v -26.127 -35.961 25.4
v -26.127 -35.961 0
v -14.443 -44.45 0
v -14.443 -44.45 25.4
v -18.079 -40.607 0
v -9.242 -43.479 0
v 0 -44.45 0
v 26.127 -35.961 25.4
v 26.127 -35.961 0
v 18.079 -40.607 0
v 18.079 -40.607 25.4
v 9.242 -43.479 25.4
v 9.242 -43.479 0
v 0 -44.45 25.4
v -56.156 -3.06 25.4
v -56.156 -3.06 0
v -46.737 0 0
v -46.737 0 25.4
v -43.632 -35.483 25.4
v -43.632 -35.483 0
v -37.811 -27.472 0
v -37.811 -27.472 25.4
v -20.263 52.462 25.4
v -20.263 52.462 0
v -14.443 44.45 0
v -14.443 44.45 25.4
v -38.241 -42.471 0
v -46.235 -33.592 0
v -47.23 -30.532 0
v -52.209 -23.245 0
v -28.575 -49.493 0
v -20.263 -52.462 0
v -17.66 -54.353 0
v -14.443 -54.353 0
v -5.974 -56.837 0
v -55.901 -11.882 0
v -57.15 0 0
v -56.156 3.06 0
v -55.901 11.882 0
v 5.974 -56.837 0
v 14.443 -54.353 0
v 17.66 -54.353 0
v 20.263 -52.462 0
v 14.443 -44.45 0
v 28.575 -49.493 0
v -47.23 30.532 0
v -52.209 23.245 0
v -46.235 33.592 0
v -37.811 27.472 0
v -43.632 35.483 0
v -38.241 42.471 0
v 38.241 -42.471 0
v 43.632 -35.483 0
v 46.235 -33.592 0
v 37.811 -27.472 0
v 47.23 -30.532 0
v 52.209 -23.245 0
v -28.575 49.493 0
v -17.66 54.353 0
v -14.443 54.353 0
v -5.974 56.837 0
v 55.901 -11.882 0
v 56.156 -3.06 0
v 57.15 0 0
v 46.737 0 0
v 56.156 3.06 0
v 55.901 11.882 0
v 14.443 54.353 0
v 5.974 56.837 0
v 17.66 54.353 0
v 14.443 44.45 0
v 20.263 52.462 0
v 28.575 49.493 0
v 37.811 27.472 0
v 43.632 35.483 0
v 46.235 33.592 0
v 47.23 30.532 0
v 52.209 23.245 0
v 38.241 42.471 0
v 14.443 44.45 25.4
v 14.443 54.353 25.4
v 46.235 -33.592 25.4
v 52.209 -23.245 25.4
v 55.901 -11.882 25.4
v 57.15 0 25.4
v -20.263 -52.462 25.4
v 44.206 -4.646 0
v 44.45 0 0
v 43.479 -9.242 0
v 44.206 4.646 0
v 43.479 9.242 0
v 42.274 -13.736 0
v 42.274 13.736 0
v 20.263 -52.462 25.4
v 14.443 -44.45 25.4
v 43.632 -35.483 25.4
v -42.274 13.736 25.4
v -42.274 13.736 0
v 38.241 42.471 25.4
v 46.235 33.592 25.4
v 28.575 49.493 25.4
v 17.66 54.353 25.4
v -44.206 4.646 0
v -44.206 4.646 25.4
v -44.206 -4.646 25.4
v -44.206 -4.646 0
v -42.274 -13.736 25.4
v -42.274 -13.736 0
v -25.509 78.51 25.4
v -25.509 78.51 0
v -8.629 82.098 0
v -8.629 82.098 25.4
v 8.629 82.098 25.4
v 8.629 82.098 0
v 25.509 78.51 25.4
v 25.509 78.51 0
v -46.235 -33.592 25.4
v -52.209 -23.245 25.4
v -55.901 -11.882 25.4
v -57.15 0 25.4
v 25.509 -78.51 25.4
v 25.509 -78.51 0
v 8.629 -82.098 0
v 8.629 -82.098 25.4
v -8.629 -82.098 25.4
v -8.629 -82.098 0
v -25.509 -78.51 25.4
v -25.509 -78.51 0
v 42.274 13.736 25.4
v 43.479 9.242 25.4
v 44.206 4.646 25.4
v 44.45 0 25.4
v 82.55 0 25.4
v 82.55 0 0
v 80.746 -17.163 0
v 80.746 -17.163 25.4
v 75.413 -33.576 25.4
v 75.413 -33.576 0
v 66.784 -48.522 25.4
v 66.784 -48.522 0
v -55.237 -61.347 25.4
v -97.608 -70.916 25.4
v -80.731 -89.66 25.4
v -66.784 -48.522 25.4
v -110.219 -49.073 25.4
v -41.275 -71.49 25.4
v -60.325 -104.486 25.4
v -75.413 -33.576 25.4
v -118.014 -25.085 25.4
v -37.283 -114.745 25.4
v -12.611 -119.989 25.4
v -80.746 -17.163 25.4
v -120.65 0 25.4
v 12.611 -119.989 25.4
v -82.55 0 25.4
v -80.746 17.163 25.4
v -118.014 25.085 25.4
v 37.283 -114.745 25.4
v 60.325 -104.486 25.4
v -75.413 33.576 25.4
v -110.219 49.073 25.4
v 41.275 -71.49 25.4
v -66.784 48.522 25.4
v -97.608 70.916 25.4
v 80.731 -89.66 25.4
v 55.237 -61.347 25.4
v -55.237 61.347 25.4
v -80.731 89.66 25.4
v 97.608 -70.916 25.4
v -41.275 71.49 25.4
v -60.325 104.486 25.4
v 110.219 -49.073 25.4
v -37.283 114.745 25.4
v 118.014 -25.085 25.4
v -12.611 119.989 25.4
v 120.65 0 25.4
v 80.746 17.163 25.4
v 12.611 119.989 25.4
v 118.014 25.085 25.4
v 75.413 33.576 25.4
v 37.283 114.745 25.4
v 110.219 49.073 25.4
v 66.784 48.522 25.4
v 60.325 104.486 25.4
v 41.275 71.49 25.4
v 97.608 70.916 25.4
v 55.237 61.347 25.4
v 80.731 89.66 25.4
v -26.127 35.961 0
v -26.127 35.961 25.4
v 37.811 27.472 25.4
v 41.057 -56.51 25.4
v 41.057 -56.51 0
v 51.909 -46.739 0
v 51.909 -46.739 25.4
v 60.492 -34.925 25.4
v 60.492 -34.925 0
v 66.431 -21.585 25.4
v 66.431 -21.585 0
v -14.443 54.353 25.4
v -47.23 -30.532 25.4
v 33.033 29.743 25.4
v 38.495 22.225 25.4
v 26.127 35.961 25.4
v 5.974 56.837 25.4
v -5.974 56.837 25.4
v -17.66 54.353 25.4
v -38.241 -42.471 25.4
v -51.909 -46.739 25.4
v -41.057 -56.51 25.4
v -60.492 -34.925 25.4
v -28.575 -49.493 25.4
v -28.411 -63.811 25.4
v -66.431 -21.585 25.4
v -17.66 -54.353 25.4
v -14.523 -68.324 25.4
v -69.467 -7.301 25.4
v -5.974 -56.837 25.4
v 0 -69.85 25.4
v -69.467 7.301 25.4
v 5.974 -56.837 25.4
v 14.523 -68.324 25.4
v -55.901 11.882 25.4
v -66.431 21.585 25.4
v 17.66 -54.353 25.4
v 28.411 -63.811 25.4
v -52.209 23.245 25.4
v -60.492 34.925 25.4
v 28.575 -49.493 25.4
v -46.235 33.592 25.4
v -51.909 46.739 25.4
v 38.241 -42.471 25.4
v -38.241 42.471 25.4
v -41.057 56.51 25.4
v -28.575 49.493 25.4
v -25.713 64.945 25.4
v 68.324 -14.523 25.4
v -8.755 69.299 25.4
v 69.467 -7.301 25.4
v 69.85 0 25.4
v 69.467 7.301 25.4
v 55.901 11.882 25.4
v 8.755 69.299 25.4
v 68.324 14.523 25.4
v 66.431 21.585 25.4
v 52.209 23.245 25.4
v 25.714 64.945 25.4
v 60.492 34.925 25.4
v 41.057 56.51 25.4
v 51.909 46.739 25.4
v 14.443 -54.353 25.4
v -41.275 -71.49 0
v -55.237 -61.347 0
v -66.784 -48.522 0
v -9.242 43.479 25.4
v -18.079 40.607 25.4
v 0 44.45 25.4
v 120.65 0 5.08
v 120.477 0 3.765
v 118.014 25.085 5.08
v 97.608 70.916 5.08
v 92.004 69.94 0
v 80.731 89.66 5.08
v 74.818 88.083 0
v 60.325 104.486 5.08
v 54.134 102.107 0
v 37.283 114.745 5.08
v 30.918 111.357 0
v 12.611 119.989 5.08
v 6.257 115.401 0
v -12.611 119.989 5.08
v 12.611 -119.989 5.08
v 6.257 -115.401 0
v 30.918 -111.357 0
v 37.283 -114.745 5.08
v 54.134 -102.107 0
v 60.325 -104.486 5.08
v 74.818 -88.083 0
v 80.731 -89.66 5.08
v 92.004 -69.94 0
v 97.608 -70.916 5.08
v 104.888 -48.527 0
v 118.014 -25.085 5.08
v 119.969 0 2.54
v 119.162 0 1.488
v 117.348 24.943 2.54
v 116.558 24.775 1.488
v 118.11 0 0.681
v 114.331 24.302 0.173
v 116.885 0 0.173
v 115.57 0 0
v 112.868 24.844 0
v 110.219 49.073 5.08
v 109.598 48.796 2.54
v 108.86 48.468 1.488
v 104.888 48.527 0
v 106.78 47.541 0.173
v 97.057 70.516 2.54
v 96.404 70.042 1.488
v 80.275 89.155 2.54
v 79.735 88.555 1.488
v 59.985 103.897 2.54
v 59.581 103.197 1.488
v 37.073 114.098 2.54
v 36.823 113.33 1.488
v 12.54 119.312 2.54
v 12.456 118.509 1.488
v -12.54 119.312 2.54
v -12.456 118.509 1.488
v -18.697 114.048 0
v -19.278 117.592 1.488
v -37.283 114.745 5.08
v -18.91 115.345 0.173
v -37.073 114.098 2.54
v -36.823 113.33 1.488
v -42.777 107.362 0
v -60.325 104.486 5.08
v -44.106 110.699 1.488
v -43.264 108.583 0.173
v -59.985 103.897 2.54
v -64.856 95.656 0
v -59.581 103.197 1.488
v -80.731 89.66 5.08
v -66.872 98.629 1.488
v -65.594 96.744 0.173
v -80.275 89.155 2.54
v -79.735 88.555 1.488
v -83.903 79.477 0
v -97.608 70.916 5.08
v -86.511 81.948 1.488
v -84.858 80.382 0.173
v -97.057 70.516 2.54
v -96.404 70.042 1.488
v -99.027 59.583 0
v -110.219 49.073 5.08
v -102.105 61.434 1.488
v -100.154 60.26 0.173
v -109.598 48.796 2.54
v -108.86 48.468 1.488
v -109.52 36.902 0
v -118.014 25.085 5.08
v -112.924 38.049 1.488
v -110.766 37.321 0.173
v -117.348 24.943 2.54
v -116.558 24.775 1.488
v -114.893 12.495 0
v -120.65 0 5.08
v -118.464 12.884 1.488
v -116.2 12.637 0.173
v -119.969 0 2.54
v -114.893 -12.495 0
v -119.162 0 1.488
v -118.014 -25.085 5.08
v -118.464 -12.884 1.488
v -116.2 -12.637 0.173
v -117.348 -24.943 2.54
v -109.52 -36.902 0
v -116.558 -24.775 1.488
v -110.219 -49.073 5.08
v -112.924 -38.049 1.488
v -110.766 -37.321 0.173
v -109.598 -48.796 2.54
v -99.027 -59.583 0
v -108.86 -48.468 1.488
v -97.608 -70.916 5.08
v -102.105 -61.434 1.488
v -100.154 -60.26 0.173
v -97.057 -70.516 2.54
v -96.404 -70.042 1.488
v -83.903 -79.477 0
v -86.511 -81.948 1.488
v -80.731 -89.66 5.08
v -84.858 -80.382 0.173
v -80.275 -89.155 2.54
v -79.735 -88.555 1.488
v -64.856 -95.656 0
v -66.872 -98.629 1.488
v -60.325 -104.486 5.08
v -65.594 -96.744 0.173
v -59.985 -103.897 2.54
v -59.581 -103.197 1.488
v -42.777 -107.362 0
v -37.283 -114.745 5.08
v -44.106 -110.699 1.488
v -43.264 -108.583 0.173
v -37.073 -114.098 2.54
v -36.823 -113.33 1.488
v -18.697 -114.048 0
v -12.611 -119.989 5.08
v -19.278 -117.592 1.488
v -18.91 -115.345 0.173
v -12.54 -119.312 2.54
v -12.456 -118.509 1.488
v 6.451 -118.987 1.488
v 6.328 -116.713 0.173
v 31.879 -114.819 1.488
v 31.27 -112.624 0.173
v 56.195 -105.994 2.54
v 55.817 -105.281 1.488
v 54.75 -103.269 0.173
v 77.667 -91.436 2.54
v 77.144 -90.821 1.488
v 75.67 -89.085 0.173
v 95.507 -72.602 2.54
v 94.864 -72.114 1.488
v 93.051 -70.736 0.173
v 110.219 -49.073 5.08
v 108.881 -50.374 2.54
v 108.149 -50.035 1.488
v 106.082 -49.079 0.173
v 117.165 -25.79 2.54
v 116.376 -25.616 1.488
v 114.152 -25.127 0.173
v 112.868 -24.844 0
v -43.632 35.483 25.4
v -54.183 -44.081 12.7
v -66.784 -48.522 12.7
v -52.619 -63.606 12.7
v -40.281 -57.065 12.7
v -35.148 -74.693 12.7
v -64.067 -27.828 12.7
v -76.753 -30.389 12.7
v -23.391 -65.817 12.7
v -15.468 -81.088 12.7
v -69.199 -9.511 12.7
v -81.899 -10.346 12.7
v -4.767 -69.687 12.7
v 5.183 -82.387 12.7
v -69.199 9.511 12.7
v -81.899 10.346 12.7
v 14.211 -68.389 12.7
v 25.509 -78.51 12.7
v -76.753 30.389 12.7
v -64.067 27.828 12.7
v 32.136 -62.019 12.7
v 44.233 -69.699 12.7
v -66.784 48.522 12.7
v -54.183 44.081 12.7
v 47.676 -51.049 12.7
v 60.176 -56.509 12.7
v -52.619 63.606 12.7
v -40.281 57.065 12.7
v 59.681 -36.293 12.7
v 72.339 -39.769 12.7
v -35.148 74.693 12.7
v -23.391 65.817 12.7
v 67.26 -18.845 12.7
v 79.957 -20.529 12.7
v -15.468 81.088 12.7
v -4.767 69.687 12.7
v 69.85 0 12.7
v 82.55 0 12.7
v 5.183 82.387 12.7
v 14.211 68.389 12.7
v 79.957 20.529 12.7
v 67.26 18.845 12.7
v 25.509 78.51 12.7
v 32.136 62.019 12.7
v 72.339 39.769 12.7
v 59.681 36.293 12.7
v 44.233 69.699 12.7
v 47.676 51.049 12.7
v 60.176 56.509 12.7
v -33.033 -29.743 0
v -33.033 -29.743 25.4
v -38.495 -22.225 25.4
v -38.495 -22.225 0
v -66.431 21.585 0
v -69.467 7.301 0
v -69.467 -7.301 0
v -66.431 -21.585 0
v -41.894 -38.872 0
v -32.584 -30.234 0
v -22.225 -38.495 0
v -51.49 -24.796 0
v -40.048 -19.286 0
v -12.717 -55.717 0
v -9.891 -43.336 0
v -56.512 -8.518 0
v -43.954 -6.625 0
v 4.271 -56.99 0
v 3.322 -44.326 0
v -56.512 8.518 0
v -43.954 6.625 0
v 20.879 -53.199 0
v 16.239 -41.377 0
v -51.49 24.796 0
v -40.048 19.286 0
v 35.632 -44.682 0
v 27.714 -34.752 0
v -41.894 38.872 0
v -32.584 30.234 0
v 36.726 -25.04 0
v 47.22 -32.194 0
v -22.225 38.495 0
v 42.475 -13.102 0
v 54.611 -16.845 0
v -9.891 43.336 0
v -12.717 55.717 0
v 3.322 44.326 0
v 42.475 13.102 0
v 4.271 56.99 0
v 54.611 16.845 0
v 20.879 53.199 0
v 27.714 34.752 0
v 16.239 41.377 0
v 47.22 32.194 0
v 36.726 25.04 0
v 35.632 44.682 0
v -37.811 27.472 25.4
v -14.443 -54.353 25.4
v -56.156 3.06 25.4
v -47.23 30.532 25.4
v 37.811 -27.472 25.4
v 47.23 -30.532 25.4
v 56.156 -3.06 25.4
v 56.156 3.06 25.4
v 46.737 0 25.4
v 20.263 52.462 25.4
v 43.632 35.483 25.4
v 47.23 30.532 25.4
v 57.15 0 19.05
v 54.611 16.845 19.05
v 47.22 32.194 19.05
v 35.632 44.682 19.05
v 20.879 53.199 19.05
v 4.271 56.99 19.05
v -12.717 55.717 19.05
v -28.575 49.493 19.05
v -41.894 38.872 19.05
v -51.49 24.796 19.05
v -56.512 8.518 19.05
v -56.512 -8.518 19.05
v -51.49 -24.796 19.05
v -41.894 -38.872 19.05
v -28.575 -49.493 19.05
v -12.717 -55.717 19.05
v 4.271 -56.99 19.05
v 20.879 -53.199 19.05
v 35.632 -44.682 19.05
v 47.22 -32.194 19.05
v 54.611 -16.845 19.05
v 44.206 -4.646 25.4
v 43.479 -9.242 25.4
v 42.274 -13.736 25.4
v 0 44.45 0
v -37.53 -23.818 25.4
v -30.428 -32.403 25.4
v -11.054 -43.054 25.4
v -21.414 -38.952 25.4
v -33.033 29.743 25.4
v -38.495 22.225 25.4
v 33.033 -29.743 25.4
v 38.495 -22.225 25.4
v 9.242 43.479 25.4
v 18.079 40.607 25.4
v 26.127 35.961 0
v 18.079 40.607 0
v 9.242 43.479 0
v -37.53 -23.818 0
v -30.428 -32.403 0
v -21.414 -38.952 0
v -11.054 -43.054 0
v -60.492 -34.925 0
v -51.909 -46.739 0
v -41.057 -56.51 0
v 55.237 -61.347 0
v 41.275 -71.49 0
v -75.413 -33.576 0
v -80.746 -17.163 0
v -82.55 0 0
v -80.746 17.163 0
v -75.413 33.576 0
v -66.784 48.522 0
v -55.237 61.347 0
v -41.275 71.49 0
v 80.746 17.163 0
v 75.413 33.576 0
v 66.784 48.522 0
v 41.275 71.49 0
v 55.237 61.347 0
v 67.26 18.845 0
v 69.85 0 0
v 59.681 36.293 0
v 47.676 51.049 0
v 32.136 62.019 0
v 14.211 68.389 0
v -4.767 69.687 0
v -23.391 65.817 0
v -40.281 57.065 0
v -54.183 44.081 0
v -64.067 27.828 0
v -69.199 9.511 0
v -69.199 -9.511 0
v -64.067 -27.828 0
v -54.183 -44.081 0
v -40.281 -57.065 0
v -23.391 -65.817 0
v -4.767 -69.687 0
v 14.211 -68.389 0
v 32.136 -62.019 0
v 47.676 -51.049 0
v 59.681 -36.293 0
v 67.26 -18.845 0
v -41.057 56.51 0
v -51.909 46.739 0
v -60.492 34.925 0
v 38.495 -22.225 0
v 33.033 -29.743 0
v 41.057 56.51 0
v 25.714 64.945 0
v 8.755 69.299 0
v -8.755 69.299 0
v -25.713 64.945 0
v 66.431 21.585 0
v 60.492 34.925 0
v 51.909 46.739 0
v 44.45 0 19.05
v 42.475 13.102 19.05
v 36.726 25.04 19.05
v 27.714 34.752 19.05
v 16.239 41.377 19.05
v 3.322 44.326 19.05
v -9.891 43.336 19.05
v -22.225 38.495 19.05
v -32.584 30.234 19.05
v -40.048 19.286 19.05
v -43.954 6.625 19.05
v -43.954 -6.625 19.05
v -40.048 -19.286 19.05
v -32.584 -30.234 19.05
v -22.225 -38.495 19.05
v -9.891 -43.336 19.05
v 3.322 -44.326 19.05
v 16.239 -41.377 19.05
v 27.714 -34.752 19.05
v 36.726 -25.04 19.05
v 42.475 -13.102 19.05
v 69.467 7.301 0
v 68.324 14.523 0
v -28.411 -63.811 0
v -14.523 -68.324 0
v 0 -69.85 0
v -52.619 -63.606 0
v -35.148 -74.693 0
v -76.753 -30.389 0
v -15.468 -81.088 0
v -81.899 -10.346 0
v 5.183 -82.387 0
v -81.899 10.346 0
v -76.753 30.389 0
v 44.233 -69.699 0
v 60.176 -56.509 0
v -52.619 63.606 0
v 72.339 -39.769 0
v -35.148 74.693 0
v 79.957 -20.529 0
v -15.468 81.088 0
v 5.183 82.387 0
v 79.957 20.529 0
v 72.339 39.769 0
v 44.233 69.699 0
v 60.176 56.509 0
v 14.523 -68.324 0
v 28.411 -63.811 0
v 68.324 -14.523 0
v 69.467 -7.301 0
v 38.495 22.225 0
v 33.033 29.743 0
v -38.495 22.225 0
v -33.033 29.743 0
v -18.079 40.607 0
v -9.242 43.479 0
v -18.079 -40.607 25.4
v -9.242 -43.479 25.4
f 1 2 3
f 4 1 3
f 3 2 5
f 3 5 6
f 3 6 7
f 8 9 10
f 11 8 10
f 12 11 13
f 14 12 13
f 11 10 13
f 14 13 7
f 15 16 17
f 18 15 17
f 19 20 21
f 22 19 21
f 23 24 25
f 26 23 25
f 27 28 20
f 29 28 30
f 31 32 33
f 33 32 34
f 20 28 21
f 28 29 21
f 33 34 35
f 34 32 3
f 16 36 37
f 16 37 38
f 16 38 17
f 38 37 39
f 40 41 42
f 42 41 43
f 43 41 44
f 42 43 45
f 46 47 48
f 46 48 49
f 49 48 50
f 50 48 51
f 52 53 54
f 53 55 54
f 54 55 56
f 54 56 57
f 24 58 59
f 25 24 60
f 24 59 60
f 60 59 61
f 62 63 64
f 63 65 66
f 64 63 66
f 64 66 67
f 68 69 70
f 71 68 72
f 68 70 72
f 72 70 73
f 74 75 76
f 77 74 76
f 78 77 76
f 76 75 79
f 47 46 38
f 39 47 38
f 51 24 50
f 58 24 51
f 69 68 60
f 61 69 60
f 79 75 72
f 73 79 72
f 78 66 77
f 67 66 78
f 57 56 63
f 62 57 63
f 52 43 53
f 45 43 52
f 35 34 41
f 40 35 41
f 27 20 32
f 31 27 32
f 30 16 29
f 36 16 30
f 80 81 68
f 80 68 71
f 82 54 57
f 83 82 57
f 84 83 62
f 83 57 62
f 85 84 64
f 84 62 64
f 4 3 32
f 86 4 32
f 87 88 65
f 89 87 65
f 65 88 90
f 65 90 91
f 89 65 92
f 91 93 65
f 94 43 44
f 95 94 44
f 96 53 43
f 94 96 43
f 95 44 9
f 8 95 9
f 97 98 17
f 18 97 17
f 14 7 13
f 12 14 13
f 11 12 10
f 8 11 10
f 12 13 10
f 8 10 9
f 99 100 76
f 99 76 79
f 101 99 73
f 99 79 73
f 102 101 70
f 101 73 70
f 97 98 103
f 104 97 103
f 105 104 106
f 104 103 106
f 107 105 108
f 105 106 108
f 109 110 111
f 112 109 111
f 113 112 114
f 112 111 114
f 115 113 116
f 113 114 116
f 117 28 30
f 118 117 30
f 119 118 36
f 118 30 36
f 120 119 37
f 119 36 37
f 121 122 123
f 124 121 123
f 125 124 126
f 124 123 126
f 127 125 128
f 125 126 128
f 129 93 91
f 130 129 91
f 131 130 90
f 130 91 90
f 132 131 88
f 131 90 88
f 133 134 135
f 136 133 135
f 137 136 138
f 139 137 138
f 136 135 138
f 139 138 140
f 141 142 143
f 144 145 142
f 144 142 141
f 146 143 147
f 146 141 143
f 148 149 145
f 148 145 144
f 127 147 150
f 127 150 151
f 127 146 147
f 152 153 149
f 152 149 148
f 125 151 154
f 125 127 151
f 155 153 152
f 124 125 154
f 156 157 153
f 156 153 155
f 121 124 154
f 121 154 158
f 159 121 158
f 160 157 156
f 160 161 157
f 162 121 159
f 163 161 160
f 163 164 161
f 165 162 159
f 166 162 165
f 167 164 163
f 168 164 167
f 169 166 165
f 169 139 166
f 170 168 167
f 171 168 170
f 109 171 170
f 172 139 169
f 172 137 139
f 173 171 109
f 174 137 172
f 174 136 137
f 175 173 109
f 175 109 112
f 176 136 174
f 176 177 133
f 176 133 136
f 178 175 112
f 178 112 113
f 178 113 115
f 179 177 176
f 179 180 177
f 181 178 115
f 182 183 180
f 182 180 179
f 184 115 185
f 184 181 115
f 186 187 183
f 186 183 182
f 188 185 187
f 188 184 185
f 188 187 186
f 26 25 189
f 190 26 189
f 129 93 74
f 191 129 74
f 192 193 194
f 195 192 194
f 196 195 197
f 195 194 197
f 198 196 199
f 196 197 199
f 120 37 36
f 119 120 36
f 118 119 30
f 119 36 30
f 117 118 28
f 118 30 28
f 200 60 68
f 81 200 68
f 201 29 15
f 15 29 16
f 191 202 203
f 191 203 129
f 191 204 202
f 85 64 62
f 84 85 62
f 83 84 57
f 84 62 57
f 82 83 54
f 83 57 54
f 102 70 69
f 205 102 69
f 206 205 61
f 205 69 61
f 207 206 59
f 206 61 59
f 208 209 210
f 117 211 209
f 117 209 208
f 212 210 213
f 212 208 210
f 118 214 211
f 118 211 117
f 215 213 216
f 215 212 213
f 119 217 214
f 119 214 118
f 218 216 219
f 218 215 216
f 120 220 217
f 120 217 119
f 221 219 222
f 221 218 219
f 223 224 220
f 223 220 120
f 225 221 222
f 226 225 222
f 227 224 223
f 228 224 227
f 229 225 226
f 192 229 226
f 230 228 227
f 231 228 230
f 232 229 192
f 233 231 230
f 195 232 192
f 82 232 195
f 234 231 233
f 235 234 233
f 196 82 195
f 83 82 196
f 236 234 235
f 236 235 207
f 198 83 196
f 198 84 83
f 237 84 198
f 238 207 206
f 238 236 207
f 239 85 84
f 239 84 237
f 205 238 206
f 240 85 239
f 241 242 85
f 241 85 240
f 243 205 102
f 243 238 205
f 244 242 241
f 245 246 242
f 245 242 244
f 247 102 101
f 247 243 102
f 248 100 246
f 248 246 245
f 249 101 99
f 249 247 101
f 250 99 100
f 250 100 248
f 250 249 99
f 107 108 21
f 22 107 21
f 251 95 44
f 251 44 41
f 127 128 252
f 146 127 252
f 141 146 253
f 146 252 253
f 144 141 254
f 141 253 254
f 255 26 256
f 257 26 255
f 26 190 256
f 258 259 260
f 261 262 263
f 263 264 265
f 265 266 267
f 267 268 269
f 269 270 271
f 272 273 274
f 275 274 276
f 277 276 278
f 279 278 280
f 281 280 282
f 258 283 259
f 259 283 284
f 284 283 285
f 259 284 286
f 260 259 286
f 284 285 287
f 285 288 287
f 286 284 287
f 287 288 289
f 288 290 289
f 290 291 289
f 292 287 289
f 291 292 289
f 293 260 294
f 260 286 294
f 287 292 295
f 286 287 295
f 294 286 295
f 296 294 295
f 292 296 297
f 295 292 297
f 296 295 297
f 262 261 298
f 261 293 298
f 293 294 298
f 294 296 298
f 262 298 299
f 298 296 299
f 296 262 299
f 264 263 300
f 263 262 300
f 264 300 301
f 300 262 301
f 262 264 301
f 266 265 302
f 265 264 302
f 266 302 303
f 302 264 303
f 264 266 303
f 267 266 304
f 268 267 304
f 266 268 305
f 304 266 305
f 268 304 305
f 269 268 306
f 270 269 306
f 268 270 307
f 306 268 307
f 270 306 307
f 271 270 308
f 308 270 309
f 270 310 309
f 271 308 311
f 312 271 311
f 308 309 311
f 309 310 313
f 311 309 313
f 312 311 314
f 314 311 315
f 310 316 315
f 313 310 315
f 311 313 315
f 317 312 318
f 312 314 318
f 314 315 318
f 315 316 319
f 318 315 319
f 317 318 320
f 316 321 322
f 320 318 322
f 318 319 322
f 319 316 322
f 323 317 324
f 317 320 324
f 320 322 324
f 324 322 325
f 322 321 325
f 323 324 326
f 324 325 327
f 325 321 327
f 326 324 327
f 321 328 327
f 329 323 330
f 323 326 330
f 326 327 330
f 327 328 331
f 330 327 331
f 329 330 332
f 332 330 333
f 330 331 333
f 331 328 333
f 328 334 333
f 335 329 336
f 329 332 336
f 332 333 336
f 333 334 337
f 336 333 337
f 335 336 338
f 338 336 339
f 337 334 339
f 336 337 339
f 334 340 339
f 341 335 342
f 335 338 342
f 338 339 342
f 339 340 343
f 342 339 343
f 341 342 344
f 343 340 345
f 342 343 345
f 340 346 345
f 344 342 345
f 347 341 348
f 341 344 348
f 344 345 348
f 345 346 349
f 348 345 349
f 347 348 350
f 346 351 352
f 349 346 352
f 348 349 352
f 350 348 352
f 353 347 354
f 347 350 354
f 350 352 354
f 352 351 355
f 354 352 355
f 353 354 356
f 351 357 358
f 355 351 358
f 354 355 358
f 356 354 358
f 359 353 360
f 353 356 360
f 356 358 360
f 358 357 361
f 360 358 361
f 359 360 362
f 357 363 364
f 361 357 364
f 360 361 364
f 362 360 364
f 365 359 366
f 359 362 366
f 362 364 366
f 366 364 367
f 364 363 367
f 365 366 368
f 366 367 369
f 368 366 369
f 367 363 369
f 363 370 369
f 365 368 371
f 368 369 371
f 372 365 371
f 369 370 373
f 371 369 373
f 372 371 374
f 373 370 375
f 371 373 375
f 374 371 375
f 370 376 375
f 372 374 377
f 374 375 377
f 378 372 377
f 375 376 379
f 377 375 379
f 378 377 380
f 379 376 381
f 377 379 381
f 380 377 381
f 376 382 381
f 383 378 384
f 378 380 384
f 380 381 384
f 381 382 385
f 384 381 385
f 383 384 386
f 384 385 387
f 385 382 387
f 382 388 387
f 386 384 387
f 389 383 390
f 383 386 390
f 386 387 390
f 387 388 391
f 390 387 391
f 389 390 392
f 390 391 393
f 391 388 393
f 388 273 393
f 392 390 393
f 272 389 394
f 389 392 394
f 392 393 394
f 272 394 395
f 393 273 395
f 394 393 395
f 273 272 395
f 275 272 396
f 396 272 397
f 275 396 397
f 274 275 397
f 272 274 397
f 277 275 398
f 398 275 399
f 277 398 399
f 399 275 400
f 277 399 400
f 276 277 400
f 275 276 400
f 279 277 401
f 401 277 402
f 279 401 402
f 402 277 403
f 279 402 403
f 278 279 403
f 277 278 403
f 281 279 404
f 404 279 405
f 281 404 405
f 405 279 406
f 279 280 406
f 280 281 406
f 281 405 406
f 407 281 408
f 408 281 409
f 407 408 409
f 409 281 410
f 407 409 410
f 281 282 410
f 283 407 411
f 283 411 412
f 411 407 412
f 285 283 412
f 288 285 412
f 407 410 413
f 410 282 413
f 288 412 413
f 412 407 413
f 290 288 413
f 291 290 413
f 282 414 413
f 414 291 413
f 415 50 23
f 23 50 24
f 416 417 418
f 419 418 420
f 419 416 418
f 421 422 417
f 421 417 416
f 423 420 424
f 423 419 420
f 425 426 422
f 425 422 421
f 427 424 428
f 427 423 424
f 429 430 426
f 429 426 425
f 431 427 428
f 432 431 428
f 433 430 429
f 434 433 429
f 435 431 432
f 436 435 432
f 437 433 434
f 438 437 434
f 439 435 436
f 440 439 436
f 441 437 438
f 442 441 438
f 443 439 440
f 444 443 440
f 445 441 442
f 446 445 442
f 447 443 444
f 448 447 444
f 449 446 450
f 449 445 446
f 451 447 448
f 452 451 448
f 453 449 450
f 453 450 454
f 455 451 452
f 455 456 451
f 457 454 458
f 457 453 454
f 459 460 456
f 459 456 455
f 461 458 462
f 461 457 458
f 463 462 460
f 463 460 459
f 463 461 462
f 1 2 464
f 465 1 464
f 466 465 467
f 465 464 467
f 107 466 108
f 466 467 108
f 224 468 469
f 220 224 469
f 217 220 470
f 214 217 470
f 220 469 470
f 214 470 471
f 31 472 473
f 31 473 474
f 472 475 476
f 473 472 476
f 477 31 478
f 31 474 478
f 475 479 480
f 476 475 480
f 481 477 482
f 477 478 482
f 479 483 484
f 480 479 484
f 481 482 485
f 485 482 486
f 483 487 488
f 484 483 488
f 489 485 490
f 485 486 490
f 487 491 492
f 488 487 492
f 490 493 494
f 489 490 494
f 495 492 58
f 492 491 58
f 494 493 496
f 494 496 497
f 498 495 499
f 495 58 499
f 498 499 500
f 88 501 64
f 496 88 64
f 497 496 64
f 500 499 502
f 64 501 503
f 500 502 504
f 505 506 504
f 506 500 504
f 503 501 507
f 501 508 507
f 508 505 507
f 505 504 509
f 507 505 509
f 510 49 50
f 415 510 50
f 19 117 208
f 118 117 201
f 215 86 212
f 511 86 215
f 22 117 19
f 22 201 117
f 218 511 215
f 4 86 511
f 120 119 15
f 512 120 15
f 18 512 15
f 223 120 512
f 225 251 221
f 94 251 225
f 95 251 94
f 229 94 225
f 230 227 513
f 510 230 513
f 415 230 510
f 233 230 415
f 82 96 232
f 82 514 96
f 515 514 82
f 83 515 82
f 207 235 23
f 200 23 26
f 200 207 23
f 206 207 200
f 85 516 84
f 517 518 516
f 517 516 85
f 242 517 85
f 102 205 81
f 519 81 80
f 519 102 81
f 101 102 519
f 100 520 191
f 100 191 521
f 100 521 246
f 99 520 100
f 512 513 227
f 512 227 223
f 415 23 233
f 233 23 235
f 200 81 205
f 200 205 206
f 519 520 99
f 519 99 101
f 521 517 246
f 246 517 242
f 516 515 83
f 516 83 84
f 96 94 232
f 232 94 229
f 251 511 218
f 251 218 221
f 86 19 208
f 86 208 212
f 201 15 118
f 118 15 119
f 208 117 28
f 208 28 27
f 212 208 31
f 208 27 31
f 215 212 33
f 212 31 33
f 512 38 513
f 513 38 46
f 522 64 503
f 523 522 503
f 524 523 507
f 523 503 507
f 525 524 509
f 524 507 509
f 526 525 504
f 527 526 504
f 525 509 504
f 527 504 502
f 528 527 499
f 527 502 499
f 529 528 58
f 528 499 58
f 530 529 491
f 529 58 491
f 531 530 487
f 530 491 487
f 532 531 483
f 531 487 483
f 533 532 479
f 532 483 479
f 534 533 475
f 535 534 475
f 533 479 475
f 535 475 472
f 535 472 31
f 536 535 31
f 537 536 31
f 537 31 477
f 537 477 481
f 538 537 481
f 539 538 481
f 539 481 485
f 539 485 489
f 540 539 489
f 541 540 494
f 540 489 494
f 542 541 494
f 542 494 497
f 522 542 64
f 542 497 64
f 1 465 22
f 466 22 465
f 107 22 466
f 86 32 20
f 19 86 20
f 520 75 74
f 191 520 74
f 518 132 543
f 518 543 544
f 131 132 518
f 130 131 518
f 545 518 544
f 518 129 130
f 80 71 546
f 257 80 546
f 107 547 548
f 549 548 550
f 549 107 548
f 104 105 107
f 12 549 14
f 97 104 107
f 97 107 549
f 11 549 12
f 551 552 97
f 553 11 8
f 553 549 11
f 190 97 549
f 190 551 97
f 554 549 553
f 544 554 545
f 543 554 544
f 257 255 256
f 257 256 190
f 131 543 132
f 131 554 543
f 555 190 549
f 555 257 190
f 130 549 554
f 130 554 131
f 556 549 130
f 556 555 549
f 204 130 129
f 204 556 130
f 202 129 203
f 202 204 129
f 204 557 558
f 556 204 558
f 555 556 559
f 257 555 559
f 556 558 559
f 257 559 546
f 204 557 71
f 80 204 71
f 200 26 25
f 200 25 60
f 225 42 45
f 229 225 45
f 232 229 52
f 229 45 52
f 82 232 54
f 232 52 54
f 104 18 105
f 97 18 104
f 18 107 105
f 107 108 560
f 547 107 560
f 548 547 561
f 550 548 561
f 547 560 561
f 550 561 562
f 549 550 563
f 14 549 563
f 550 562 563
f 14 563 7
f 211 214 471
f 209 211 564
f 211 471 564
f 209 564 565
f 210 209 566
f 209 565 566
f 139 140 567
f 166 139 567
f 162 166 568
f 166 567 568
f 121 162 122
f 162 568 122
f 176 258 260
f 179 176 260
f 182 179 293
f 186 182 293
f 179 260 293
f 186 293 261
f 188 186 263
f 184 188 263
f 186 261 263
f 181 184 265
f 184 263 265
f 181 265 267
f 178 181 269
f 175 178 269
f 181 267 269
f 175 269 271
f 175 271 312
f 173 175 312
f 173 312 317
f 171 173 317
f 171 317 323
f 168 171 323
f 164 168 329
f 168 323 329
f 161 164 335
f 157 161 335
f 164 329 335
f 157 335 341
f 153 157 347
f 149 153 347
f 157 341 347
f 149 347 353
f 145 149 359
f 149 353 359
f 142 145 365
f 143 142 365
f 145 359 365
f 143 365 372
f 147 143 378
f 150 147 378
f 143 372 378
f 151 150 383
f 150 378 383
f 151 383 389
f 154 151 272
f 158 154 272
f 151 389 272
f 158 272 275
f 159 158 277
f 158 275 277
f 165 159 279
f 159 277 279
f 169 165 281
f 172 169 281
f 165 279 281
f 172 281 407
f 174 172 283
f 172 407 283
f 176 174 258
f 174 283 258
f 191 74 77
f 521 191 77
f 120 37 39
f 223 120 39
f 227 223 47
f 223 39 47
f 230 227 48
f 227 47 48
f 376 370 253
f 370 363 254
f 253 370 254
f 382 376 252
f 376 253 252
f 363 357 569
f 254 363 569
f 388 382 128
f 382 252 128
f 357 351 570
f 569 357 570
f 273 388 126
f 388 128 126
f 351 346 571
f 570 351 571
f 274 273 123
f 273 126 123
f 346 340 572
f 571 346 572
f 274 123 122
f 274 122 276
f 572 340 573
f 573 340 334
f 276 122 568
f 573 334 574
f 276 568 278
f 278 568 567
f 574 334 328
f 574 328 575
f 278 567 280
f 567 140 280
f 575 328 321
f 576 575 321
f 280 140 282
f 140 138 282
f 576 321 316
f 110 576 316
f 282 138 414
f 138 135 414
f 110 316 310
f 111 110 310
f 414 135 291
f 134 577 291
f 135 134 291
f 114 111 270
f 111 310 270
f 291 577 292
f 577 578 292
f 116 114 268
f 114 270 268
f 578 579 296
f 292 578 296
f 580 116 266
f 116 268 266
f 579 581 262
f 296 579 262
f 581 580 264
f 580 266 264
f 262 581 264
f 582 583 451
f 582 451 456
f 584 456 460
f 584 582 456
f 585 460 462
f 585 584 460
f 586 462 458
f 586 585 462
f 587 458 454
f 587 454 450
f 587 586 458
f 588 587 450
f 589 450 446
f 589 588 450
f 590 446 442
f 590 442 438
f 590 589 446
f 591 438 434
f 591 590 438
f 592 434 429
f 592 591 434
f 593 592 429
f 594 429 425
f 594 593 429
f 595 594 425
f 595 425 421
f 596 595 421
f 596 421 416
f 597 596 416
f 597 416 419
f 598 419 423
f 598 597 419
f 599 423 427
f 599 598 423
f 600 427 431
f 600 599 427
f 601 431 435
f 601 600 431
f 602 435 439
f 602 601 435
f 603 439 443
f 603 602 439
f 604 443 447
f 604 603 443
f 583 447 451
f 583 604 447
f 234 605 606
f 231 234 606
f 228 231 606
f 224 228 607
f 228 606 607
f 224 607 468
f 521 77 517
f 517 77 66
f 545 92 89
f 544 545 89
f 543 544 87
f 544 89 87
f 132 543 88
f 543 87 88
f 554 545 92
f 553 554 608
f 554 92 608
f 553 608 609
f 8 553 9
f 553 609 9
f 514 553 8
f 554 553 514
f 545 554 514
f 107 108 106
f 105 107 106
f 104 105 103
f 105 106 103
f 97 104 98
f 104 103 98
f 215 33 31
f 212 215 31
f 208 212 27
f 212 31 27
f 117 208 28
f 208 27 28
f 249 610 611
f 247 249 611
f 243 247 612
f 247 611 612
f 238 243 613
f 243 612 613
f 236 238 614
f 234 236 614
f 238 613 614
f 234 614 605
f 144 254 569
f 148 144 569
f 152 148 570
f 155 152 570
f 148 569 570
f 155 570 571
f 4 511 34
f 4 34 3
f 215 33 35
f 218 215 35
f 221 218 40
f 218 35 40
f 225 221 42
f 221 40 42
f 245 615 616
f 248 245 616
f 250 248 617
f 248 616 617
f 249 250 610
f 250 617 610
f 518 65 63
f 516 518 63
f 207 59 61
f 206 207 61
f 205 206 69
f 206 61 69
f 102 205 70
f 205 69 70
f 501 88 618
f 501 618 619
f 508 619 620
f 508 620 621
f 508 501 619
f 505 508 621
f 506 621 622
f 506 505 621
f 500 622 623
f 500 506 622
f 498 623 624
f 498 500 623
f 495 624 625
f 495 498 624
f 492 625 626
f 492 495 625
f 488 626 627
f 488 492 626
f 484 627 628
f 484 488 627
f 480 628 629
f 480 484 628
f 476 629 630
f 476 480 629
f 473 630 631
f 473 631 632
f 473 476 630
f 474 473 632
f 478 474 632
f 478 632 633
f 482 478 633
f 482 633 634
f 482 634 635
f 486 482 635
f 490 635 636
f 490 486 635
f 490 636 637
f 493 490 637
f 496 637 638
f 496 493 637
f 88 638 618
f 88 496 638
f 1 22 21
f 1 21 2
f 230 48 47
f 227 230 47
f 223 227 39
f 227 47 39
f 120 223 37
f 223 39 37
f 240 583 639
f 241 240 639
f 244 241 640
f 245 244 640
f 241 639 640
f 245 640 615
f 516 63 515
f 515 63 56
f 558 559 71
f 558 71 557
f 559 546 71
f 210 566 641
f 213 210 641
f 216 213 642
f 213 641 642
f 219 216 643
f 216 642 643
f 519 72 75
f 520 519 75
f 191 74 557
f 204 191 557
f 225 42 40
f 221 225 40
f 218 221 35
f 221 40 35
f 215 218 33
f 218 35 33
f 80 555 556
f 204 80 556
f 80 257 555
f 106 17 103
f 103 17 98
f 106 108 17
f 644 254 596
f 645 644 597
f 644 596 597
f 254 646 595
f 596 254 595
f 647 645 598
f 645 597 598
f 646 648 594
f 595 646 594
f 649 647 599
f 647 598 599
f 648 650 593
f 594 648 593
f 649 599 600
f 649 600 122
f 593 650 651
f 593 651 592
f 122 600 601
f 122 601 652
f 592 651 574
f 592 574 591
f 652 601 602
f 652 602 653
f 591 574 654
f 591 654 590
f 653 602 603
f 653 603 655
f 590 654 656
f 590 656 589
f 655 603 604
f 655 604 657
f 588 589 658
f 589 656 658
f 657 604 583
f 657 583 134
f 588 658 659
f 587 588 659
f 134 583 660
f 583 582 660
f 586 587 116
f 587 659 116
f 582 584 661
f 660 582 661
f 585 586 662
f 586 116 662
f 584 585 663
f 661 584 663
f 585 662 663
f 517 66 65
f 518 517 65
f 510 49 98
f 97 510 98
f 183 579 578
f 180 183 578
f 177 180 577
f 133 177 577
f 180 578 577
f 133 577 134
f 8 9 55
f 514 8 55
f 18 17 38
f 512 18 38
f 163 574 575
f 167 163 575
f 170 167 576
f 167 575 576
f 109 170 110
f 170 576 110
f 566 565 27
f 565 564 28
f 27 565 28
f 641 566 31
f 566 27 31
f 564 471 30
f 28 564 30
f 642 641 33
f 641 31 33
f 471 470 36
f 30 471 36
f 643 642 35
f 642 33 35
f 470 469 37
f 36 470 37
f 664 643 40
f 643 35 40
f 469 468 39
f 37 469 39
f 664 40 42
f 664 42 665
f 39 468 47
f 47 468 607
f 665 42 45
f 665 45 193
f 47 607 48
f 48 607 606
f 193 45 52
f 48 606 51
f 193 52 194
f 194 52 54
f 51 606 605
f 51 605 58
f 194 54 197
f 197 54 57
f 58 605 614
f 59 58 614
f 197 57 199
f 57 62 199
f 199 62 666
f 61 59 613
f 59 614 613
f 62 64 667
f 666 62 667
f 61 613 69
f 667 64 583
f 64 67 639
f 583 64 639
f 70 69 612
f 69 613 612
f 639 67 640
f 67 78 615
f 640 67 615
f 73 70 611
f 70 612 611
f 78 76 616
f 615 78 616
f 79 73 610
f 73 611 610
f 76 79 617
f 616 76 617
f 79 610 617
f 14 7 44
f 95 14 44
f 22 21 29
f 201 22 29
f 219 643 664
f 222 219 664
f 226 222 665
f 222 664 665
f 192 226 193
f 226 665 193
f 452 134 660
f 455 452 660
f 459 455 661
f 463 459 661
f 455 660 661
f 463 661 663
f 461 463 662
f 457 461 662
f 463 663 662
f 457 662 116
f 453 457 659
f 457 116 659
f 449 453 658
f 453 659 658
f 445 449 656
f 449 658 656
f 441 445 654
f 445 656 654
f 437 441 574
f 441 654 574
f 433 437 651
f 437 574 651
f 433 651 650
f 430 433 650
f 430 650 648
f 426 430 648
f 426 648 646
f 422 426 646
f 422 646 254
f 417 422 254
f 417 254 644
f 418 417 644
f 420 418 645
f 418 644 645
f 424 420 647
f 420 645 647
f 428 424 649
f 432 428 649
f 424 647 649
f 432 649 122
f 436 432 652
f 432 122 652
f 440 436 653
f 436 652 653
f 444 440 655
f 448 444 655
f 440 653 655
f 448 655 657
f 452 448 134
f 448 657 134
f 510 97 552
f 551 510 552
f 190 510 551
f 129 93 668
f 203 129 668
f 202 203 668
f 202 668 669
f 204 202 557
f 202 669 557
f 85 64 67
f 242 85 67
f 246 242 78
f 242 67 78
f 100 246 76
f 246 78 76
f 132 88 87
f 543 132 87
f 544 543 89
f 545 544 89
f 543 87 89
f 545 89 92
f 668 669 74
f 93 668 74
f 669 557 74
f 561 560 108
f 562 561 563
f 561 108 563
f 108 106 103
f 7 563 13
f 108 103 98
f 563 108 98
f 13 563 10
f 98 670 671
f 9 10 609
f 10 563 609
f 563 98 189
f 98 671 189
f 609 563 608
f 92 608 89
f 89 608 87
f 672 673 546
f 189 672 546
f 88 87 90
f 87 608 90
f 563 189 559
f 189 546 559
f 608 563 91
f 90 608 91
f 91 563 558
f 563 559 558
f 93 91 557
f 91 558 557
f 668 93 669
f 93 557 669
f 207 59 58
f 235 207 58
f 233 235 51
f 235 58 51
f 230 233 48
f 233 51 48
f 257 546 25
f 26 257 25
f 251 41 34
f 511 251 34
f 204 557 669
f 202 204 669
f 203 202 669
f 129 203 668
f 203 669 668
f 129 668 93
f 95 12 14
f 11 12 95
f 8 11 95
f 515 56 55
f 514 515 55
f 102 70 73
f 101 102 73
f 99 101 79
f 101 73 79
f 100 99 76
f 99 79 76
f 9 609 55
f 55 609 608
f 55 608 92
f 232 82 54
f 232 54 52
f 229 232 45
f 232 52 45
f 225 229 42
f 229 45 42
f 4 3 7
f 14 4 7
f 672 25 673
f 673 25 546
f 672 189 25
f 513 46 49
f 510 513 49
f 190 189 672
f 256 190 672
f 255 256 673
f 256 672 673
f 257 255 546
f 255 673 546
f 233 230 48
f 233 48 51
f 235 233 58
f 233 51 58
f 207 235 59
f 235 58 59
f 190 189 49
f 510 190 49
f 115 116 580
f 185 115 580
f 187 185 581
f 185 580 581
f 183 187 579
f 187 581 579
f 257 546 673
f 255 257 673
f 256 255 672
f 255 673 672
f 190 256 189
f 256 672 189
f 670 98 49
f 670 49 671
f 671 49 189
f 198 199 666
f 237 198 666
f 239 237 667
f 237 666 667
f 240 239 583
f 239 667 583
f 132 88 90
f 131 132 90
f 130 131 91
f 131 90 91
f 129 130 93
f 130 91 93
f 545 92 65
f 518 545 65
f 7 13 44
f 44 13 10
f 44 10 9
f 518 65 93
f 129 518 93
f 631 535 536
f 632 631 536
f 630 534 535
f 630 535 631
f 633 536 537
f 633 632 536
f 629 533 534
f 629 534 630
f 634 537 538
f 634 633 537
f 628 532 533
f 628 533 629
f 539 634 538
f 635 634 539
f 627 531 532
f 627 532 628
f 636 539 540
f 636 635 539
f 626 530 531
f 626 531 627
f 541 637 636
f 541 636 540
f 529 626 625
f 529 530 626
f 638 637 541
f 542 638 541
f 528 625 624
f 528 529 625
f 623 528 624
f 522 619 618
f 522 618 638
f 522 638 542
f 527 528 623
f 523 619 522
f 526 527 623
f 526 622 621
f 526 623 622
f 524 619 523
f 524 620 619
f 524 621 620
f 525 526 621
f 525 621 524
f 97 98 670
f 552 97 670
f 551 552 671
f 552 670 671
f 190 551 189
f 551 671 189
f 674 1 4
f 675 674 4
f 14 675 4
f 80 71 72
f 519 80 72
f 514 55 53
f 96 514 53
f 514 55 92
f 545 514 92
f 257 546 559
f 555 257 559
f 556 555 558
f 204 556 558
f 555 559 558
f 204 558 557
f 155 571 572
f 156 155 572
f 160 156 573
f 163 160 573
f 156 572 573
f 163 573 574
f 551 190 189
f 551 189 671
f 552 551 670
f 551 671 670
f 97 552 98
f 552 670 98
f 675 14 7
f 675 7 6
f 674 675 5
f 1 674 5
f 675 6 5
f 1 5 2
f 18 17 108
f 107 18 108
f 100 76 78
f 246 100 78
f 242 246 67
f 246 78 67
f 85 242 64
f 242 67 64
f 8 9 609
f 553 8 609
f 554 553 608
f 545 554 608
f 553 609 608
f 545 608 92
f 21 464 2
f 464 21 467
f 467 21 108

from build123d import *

# Parameters (mm, degrees)
F0_R     = 120.65
F1_DEPTH = 25.4
F2_R     = 82.55
F2_R_2   = 69.85
F3_DEPTH = 12.7
F2_R_3   = 57.15
F2_R_4   = 44.45
F4_DEPTH = 19.05
F5_R     = 5.08
F6_DEPTH = 25.4


with BuildPart() as f1:
    # F0 (on Top) → F1 (new body)
    with BuildSketch(Plane.XY):
        Circle(F0_R)
        with BuildLine():
            ThreePointArc((25.5093528857, -78.5097154202), (0, -82.55), (-25.5093528857, -78.5097154202))
            ThreePointArc((-25.5093528857, -78.5097154202), (-48.5216725767, -66.7843528857), (-66.7843528857, -48.5216725767))
            ThreePointArc((-66.7843528857, -48.5216725767), (-78.5097154202, -25.5093528857), (-82.55, 0))
            ThreePointArc((-82.55, 0), (-78.5097154202, 25.5093528857), (-66.7843528857, 48.5216725767))
            ThreePointArc((-66.7843528857, 48.5216725767), (-48.5216725767, 66.7843528857), (-25.5093528857, 78.5097154202))
            ThreePointArc((-25.5093528857, 78.5097154202), (0, 82.55), (25.5093528857, 78.5097154202))
            ThreePointArc((25.5093528857, 78.5097154202), (48.5216725767, 66.7843528857), (66.7843528857, 48.5216725767))
            ThreePointArc((66.7843528857, 48.5216725767), (78.5097154202, 25.5093528857), (82.55, 0))
            ThreePointArc((82.55, 0), (78.5097154202, -25.5093528857), (66.7843528857, -48.5216725767))
            ThreePointArc((66.7843528857, -48.5216725767), (48.5216725767, -66.7843528857), (25.5093528857, -78.5097154202))
        make_face(mode=Mode.SUBTRACT)
    extrude(amount=F1_DEPTH)

    # F5
    f5_edges = [f1.edges().sort_by_distance(p)[0] for p in [
        (-120.65, 0, 0),
    ]]
    fillet(f5_edges, radius=F5_R)


with BuildPart() as f1b:
    # F0 (on Top) → F1, piece 2 (new body)
    with BuildSketch(Plane.XY):
        with BuildLine():
            ThreePointArc((66.4312976021, -21.5848372453), (68.9900305751, -10.9269474808), (69.85, 0))
            ThreePointArc((69.85, 0), (68.9900306537, 10.9269469846), (66.4312979125, 21.5848362898))
            ThreePointArc((66.4312979125, 21.5848362898), (56.509837448, 41.0567993346), (41.056800296, 56.5098367495))
            ThreePointArc((41.056800296, 56.5098367495), (21.5848373059, 66.4312975824), (0, 69.85))
            ThreePointArc((0, 69.85), (-21.5848369481, 66.4312976986), (-41.0567996872, 56.5098371918))
            ThreePointArc((-41.0567996872, 56.5098371918), (-56.5098370444, 41.0567998901), (-66.4312977207, 21.5848368803))
            ThreePointArc((-66.4312977207, 21.5848368803), (-69.85, -1.919e-07), (-66.4312976021, -21.5848372453))
            ThreePointArc((-66.4312976021, -21.5848372453), (-56.5098371746, -41.0567997109), (-41.0568003562, -56.5098367057))
            ThreePointArc((-41.0568003562, -56.5098367057), (-21.5848373413, -66.4312975709), (0, -69.85))
            ThreePointArc((0, -69.85), (21.5848367731, -66.4312977555), (41.0567993894, -56.5098374082))
            ThreePointArc((41.0567993894, -56.5098374082), (56.5098368234, -41.0568001943), (66.4312976021, -21.5848372453))
        make_face()
        with BuildLine():
            ThreePointArc((17.6603212285, 54.3528799063), (33.5919271685, 46.2353212285), (46.2353212285, 33.5919271685))
            ThreePointArc((46.2353212285, 33.5919271685), (54.3528799063, 17.6603212285), (57.15, 0))
            ThreePointArc((57.15, 0), (54.3528799063, -17.6603212285), (46.2353212285, -33.5919271685))
            ThreePointArc((46.2353212285, -33.5919271685), (33.5919271685, -46.2353212285), (17.6603212285, -54.3528799063))
            ThreePointArc((17.6603212285, -54.3528799063), (0, -57.15), (-17.6603212285, -54.3528799063))
            ThreePointArc((-17.6603212285, -54.3528799063), (-33.5919271685, -46.2353212285), (-46.2353212285, -33.5919271685))
            ThreePointArc((-46.2353212285, -33.5919271685), (-54.3528799063, -17.6603212285), (-57.15, 0))
            ThreePointArc((-57.15, 0), (-54.3528799063, 17.6603212285), (-46.2353212285, 33.5919271685))
            ThreePointArc((-46.2353212285, 33.5919271685), (-33.5919271685, 46.2353212285), (-17.6603212285, 54.3528799063))
            ThreePointArc((-17.6603212285, 54.3528799063), (0, 57.15), (17.6603212285, 54.3528799063))
        make_face(mode=Mode.SUBTRACT)
    extrude(amount=F1_DEPTH)


with BuildPart() as f1c:
    # F0 (on Top) → F1, piece 3 (new body)
    with BuildSketch(Plane.XY):
        with BuildLine():
            ThreePointArc((42.2744623313, -13.7358048399), (43.9027467855, -6.9535116802), (44.45, 0))
            ThreePointArc((44.45, 0), (43.9027467394, 6.9535119712), (42.2744621492, 13.7358054003))
            ThreePointArc((42.2744621492, 13.7358054003), (35.9608053613, 26.1270545177), (26.1270543581, 35.9608054772))
            ThreePointArc((26.1270543581, 35.9608054772), (13.7358053375, 42.2744621696), (0, 44.45))
            ThreePointArc((0, 44.45), (-13.7358054792, 42.2744621236), (-26.1270545992, 35.960805302))
            ThreePointArc((-26.1270545992, 35.960805302), (-35.9608054489, 26.1270543971), (-42.2744621492, 13.7358054003))
            ThreePointArc((-42.2744621492, 13.7358054003), (-44.45, 0), (-42.2744621492, -13.7358054003))
            ThreePointArc((-42.2744621492, -13.7358054003), (-35.9608055571, -26.1270542481), (-26.1270548973, -35.9608050854))
            ThreePointArc((-26.1270548973, -35.9608050854), (-13.7358056544, -42.2744620666), (0, -44.45))
            ThreePointArc((0, -44.45), (13.7358053375, -42.2744621696), (26.1270543581, -35.9608054772))
            ThreePointArc((26.1270543581, -35.9608054772), (35.9608055344, -26.1270542793), (42.2744623313, -13.7358048399))
        make_face()
    extrude(amount=F1_DEPTH)


with BuildPart() as f3:
    # F2 (on Top) → F3 (new body)
    with BuildSketch(Plane.XY):
        Circle(F2_R)
        Circle(F2_R_2, mode=Mode.SUBTRACT)
    extrude(amount=F3_DEPTH)


with BuildPart() as f4:
    # F2 (on Top) → F4 (new body)
    with BuildSketch(Plane.XY):
        Circle(F2_R_3)
        Circle(F2_R_4, mode=Mode.SUBTRACT)
    extrude(amount=F4_DEPTH)


with BuildPart() as f6:
    # F0 (on Top) → F6 (new body)
    with BuildSketch(Plane.XY):
        Polygon((-20.2634472617, 52.4615981374), (-14.4426804976, 44.45), (-14.4426804976, 54.3528799063), (-17.6603212285, 54.3528799063), align=None)
        with BuildLine():
            Line((-14.4426804976, 54.3528799063), (14.4426804976, 54.3528799063))
            Line((14.4426804976, 54.3528799063), (17.6603212285, 54.3528799063))
            ThreePointArc((17.6603212285, 54.3528799063), (0, 57.15), (-17.6603212285, 54.3528799063))
            Line((-17.6603212285, 54.3528799063), (-14.4426804976, 54.3528799063))
        make_face()
        with BuildLine():
            Line((-43.6321951954, 35.4832089374), (-20.2634472617, 52.4615981374))
            Line((-20.2634472617, 52.4615981374), (-17.6603212285, 54.3528799063))
            ThreePointArc((-17.6603212285, 54.3528799063), (-33.5919271685, 46.2353212285), (-46.2353212285, 33.5919271685))
            Line((-46.2353212285, 33.5919271685), (-43.6321951954, 35.4832089374))
        make_face()
        Polygon((14.4426804976, 54.3528799063), (14.4426804976, 44.45), (20.2634472617, 52.4615981374), (17.6603212285, 54.3528799063), align=None)
        with BuildLine():
            Line((20.2634472617, 52.4615981374), (43.6321951954, 35.4832089374))
            Line((43.6321951954, 35.4832089374), (46.2353212285, 33.5919271685))
            ThreePointArc((46.2353212285, 33.5919271685), (33.5919271685, 46.2353212285), (17.6603212285, 54.3528799063))
            Line((17.6603212285, 54.3528799063), (20.2634472617, 52.4615981374))
        make_face()
        Polygon((43.6321951954, 35.4832089374), (37.8114284312, 27.4716107999), (47.2296268962, 30.5317689842), (46.2353212285, 33.5919271685), align=None)
        with BuildLine():
            Line((46.2353212285, 33.5919271685), (47.2296268962, 30.5317689842))
            Line((47.2296268962, 30.5317689842), (56.1556943323, 3.0601581843))
            Line((56.1556943323, 3.0601581843), (57.15, 0))
            ThreePointArc((57.15, 0), (54.3528799063, 17.6603212285), (46.2353212285, 33.5919271685))
        make_face()
        Polygon((56.1556943323, 3.0601581843), (46.7374958674, 0), (56.1556943323, -3.0601581843), (57.15, 0), align=None)
        with BuildLine():
            Line((57.15, 0), (56.1556943323, -3.0601581843))
            Line((56.1556943323, -3.0601581843), (47.2296268962, -30.5317689842))
            Line((47.2296268962, -30.5317689842), (46.2353212285, -33.5919271685))
            ThreePointArc((46.2353212285, -33.5919271685), (54.3528799063, -17.6603212285), (57.15, 0))
        make_face()
        Polygon((47.2296268962, -30.5317689842), (37.8114284312, -27.4716107999), (43.6321951954, -35.4832089374), (46.2353212285, -33.5919271685), align=None)
        with BuildLine():
            Line((46.2353212285, -33.5919271685), (43.6321951954, -35.4832089374))
            Line((43.6321951954, -35.4832089374), (20.2634472617, -52.4615981374))
            Line((20.2634472617, -52.4615981374), (17.6603212285, -54.3528799063))
            ThreePointArc((17.6603212285, -54.3528799063), (33.5919271685, -46.2353212285), (46.2353212285, -33.5919271685))
        make_face()
        with BuildLine():
            Line((17.6603212285, -54.3528799063), (14.4426804976, -54.3528799063))
            Line((14.4426804976, -54.3528799063), (-14.4426804976, -54.3528799063))
            Line((-14.4426804976, -54.3528799063), (-17.6603212285, -54.3528799063))
            ThreePointArc((-17.6603212285, -54.3528799063), (0, -57.15), (17.6603212285, -54.3528799063))
        make_face()
        Polygon((20.2634472617, -52.4615981374), (14.4426804976, -44.45), (14.4426804976, -54.3528799063), (17.6603212285, -54.3528799063), align=None)
        Polygon((-14.4426804976, -54.3528799063), (-14.4426804976, -44.45), (-20.2634472617, -52.4615981374), (-17.6603212285, -54.3528799063), align=None)
        with BuildLine():
            Line((-17.6603212285, -54.3528799063), (-20.2634472617, -52.4615981374))
            Line((-20.2634472617, -52.4615981374), (-43.6321951954, -35.4832089374))
            Line((-43.6321951954, -35.4832089374), (-46.2353212285, -33.5919271685))
            ThreePointArc((-46.2353212285, -33.5919271685), (-33.5919271685, -46.2353212285), (-17.6603212285, -54.3528799063))
        make_face()
        Polygon((-43.6321951954, -35.4832089374), (-37.8114284312, -27.4716107999), (-47.2296268962, -30.5317689842), (-46.2353212285, -33.5919271685), align=None)
        with BuildLine():
            Line((-46.2353212285, -33.5919271685), (-47.2296268962, -30.5317689842))
            Line((-47.2296268962, -30.5317689842), (-56.1556943323, -3.0601581843))
            Line((-56.1556943323, -3.0601581843), (-57.15, 0))
            ThreePointArc((-57.15, 0), (-54.3528799063, -17.6603212285), (-46.2353212285, -33.5919271685))
        make_face()
        Polygon((-56.1556943323, -3.0601581843), (-46.7374958674, 0), (-56.1556943323, 3.0601581843), (-57.15, 0), align=None)
        with BuildLine():
            Line((-56.1556943323, 3.0601581843), (-47.2296268962, 30.5317689842))
            Line((-47.2296268962, 30.5317689842), (-46.2353212285, 33.5919271685))
            ThreePointArc((-46.2353212285, 33.5919271685), (-54.3528799063, 17.6603212285), (-57.15, 0))
            Line((-57.15, 0), (-56.1556943323, 3.0601581843))
        make_face()
        Polygon((-47.2296268962, 30.5317689842), (-37.8114284312, 27.4716107999), (-43.6321951954, 35.4832089374), (-46.2353212285, 33.5919271685), align=None)
    extrude(amount=F6_DEPTH)


with BuildPart() as f6b:
    # F0 (on Top) → F6, piece 2 (new body)
    with BuildSketch(Plane.XY):
        with BuildLine():
            ThreePointArc((-26.1270545992, 35.960805302), (-13.7358054792, 42.2744621236), (0, 44.45))
            Line((0, 44.45), (-14.4426804976, 44.45))
            Line((-14.4426804976, 44.45), (-26.1270545992, 35.960805302))
        make_face()
    extrude(amount=F6_DEPTH)


with BuildPart() as f6c:
    # F0 (on Top) → F6, piece 3 (new body)
    with BuildSketch(Plane.XY):
        with BuildLine():
            ThreePointArc((0, 44.45), (13.7358053375, 42.2744621696), (26.1270543581, 35.9608054772))
            Line((26.1270543581, 35.9608054772), (14.4426804976, 44.45))
            Line((14.4426804976, 44.45), (0, 44.45))
        make_face()
    extrude(amount=F6_DEPTH)


with BuildPart() as f6d:
    # F0 (on Top) → F6, piece 4 (new body)
    with BuildSketch(Plane.XY):
        with BuildLine():
            ThreePointArc((26.1270543581, 35.9608054772), (35.9608053613, 26.1270545177), (42.2744621492, 13.7358054003))
            Line((42.2744621492, 13.7358054003), (37.8114284312, 27.4716107999))
            Line((37.8114284312, 27.4716107999), (26.1270543581, 35.9608054772))
        make_face()
    extrude(amount=F6_DEPTH)


with BuildPart() as f6e:
    # F0 (on Top) → F6, piece 5 (new body)
    with BuildSketch(Plane.XY):
        with BuildLine():
            ThreePointArc((42.2744621492, 13.7358054003), (43.9027467394, 6.9535119712), (44.45, 0))
            ThreePointArc((44.45, 0), (43.9027467855, -6.9535116802), (42.2744623313, -13.7358048399))
            Line((42.2744623313, -13.7358048399), (46.7374958674, 0))
            Line((46.7374958674, 0), (42.2744621492, 13.7358054003))
        make_face()
    extrude(amount=F6_DEPTH)


with BuildPart() as f6f:
    # F0 (on Top) → F6, piece 6 (new body)
    with BuildSketch(Plane.XY):
        with BuildLine():
            Line((37.8114284312, -27.4716107999), (42.2744623313, -13.7358048399))
            ThreePointArc((42.2744623313, -13.7358048399), (35.9608055344, -26.1270542793), (26.1270543581, -35.9608054772))
            Line((26.1270543581, -35.9608054772), (37.8114284312, -27.4716107999))
        make_face()
    extrude(amount=F6_DEPTH)


with BuildPart() as f6g:
    # F0 (on Top) → F6, piece 7 (new body)
    with BuildSketch(Plane.XY):
        with BuildLine():
            Line((14.4426804976, -44.45), (26.1270543581, -35.9608054772))
            ThreePointArc((26.1270543581, -35.9608054772), (13.7358053375, -42.2744621696), (0, -44.45))
            Line((0, -44.45), (14.4426804976, -44.45))
        make_face()
    extrude(amount=F6_DEPTH)


with BuildPart() as f6h:
    # F0 (on Top) → F6, piece 8 (new body)
    with BuildSketch(Plane.XY):
        with BuildLine():
            Line((-14.4426804976, -44.45), (0, -44.45))
            ThreePointArc((0, -44.45), (-13.7358056544, -42.2744620666), (-26.1270548973, -35.9608050854))
            Line((-26.1270548973, -35.9608050854), (-14.4426804976, -44.45))
        make_face()
    extrude(amount=F6_DEPTH)


with BuildPart() as f6i:
    # F0 (on Top) → F6, piece 9 (new body)
    with BuildSketch(Plane.XY):
        with BuildLine():
            Line((-37.8114284312, -27.4716107999), (-26.1270548973, -35.9608050854))
            ThreePointArc((-26.1270548973, -35.9608050854), (-35.9608055571, -26.1270542481), (-42.2744621492, -13.7358054003))
            Line((-42.2744621492, -13.7358054003), (-37.8114284312, -27.4716107999))
        make_face()
    extrude(amount=F6_DEPTH)


with BuildPart() as f6j:
    # F0 (on Top) → F6, piece 10 (new body)
    with BuildSketch(Plane.XY):
        with BuildLine():
            ThreePointArc((-42.2744621492, -13.7358054003), (-44.45, 0), (-42.2744621492, 13.7358054003))
            Line((-42.2744621492, 13.7358054003), (-46.7374958674, 0))
            Line((-46.7374958674, 0), (-42.2744621492, -13.7358054003))
        make_face()
    extrude(amount=F6_DEPTH)


with BuildPart() as f6k:
    # F0 (on Top) → F6, piece 11 (new body)
    with BuildSketch(Plane.XY):
        with BuildLine():
            ThreePointArc((-42.2744621492, 13.7358054003), (-35.9608054489, 26.1270543971), (-26.1270545992, 35.960805302))
            Line((-26.1270545992, 35.960805302), (-37.8114284312, 27.4716107999))
            Line((-37.8114284312, 27.4716107999), (-42.2744621492, 13.7358054003))
        make_face()
    extrude(amount=F6_DEPTH)


solid = Compound([f1.part, f1b.part, f1c.part, f3.part, f4.part, f6.part, f6b.part, f6c.part, f6d.part, f6e.part, f6f.part, f6g.part, f6h.part, f6i.part, f6j.part, f6k.part])
